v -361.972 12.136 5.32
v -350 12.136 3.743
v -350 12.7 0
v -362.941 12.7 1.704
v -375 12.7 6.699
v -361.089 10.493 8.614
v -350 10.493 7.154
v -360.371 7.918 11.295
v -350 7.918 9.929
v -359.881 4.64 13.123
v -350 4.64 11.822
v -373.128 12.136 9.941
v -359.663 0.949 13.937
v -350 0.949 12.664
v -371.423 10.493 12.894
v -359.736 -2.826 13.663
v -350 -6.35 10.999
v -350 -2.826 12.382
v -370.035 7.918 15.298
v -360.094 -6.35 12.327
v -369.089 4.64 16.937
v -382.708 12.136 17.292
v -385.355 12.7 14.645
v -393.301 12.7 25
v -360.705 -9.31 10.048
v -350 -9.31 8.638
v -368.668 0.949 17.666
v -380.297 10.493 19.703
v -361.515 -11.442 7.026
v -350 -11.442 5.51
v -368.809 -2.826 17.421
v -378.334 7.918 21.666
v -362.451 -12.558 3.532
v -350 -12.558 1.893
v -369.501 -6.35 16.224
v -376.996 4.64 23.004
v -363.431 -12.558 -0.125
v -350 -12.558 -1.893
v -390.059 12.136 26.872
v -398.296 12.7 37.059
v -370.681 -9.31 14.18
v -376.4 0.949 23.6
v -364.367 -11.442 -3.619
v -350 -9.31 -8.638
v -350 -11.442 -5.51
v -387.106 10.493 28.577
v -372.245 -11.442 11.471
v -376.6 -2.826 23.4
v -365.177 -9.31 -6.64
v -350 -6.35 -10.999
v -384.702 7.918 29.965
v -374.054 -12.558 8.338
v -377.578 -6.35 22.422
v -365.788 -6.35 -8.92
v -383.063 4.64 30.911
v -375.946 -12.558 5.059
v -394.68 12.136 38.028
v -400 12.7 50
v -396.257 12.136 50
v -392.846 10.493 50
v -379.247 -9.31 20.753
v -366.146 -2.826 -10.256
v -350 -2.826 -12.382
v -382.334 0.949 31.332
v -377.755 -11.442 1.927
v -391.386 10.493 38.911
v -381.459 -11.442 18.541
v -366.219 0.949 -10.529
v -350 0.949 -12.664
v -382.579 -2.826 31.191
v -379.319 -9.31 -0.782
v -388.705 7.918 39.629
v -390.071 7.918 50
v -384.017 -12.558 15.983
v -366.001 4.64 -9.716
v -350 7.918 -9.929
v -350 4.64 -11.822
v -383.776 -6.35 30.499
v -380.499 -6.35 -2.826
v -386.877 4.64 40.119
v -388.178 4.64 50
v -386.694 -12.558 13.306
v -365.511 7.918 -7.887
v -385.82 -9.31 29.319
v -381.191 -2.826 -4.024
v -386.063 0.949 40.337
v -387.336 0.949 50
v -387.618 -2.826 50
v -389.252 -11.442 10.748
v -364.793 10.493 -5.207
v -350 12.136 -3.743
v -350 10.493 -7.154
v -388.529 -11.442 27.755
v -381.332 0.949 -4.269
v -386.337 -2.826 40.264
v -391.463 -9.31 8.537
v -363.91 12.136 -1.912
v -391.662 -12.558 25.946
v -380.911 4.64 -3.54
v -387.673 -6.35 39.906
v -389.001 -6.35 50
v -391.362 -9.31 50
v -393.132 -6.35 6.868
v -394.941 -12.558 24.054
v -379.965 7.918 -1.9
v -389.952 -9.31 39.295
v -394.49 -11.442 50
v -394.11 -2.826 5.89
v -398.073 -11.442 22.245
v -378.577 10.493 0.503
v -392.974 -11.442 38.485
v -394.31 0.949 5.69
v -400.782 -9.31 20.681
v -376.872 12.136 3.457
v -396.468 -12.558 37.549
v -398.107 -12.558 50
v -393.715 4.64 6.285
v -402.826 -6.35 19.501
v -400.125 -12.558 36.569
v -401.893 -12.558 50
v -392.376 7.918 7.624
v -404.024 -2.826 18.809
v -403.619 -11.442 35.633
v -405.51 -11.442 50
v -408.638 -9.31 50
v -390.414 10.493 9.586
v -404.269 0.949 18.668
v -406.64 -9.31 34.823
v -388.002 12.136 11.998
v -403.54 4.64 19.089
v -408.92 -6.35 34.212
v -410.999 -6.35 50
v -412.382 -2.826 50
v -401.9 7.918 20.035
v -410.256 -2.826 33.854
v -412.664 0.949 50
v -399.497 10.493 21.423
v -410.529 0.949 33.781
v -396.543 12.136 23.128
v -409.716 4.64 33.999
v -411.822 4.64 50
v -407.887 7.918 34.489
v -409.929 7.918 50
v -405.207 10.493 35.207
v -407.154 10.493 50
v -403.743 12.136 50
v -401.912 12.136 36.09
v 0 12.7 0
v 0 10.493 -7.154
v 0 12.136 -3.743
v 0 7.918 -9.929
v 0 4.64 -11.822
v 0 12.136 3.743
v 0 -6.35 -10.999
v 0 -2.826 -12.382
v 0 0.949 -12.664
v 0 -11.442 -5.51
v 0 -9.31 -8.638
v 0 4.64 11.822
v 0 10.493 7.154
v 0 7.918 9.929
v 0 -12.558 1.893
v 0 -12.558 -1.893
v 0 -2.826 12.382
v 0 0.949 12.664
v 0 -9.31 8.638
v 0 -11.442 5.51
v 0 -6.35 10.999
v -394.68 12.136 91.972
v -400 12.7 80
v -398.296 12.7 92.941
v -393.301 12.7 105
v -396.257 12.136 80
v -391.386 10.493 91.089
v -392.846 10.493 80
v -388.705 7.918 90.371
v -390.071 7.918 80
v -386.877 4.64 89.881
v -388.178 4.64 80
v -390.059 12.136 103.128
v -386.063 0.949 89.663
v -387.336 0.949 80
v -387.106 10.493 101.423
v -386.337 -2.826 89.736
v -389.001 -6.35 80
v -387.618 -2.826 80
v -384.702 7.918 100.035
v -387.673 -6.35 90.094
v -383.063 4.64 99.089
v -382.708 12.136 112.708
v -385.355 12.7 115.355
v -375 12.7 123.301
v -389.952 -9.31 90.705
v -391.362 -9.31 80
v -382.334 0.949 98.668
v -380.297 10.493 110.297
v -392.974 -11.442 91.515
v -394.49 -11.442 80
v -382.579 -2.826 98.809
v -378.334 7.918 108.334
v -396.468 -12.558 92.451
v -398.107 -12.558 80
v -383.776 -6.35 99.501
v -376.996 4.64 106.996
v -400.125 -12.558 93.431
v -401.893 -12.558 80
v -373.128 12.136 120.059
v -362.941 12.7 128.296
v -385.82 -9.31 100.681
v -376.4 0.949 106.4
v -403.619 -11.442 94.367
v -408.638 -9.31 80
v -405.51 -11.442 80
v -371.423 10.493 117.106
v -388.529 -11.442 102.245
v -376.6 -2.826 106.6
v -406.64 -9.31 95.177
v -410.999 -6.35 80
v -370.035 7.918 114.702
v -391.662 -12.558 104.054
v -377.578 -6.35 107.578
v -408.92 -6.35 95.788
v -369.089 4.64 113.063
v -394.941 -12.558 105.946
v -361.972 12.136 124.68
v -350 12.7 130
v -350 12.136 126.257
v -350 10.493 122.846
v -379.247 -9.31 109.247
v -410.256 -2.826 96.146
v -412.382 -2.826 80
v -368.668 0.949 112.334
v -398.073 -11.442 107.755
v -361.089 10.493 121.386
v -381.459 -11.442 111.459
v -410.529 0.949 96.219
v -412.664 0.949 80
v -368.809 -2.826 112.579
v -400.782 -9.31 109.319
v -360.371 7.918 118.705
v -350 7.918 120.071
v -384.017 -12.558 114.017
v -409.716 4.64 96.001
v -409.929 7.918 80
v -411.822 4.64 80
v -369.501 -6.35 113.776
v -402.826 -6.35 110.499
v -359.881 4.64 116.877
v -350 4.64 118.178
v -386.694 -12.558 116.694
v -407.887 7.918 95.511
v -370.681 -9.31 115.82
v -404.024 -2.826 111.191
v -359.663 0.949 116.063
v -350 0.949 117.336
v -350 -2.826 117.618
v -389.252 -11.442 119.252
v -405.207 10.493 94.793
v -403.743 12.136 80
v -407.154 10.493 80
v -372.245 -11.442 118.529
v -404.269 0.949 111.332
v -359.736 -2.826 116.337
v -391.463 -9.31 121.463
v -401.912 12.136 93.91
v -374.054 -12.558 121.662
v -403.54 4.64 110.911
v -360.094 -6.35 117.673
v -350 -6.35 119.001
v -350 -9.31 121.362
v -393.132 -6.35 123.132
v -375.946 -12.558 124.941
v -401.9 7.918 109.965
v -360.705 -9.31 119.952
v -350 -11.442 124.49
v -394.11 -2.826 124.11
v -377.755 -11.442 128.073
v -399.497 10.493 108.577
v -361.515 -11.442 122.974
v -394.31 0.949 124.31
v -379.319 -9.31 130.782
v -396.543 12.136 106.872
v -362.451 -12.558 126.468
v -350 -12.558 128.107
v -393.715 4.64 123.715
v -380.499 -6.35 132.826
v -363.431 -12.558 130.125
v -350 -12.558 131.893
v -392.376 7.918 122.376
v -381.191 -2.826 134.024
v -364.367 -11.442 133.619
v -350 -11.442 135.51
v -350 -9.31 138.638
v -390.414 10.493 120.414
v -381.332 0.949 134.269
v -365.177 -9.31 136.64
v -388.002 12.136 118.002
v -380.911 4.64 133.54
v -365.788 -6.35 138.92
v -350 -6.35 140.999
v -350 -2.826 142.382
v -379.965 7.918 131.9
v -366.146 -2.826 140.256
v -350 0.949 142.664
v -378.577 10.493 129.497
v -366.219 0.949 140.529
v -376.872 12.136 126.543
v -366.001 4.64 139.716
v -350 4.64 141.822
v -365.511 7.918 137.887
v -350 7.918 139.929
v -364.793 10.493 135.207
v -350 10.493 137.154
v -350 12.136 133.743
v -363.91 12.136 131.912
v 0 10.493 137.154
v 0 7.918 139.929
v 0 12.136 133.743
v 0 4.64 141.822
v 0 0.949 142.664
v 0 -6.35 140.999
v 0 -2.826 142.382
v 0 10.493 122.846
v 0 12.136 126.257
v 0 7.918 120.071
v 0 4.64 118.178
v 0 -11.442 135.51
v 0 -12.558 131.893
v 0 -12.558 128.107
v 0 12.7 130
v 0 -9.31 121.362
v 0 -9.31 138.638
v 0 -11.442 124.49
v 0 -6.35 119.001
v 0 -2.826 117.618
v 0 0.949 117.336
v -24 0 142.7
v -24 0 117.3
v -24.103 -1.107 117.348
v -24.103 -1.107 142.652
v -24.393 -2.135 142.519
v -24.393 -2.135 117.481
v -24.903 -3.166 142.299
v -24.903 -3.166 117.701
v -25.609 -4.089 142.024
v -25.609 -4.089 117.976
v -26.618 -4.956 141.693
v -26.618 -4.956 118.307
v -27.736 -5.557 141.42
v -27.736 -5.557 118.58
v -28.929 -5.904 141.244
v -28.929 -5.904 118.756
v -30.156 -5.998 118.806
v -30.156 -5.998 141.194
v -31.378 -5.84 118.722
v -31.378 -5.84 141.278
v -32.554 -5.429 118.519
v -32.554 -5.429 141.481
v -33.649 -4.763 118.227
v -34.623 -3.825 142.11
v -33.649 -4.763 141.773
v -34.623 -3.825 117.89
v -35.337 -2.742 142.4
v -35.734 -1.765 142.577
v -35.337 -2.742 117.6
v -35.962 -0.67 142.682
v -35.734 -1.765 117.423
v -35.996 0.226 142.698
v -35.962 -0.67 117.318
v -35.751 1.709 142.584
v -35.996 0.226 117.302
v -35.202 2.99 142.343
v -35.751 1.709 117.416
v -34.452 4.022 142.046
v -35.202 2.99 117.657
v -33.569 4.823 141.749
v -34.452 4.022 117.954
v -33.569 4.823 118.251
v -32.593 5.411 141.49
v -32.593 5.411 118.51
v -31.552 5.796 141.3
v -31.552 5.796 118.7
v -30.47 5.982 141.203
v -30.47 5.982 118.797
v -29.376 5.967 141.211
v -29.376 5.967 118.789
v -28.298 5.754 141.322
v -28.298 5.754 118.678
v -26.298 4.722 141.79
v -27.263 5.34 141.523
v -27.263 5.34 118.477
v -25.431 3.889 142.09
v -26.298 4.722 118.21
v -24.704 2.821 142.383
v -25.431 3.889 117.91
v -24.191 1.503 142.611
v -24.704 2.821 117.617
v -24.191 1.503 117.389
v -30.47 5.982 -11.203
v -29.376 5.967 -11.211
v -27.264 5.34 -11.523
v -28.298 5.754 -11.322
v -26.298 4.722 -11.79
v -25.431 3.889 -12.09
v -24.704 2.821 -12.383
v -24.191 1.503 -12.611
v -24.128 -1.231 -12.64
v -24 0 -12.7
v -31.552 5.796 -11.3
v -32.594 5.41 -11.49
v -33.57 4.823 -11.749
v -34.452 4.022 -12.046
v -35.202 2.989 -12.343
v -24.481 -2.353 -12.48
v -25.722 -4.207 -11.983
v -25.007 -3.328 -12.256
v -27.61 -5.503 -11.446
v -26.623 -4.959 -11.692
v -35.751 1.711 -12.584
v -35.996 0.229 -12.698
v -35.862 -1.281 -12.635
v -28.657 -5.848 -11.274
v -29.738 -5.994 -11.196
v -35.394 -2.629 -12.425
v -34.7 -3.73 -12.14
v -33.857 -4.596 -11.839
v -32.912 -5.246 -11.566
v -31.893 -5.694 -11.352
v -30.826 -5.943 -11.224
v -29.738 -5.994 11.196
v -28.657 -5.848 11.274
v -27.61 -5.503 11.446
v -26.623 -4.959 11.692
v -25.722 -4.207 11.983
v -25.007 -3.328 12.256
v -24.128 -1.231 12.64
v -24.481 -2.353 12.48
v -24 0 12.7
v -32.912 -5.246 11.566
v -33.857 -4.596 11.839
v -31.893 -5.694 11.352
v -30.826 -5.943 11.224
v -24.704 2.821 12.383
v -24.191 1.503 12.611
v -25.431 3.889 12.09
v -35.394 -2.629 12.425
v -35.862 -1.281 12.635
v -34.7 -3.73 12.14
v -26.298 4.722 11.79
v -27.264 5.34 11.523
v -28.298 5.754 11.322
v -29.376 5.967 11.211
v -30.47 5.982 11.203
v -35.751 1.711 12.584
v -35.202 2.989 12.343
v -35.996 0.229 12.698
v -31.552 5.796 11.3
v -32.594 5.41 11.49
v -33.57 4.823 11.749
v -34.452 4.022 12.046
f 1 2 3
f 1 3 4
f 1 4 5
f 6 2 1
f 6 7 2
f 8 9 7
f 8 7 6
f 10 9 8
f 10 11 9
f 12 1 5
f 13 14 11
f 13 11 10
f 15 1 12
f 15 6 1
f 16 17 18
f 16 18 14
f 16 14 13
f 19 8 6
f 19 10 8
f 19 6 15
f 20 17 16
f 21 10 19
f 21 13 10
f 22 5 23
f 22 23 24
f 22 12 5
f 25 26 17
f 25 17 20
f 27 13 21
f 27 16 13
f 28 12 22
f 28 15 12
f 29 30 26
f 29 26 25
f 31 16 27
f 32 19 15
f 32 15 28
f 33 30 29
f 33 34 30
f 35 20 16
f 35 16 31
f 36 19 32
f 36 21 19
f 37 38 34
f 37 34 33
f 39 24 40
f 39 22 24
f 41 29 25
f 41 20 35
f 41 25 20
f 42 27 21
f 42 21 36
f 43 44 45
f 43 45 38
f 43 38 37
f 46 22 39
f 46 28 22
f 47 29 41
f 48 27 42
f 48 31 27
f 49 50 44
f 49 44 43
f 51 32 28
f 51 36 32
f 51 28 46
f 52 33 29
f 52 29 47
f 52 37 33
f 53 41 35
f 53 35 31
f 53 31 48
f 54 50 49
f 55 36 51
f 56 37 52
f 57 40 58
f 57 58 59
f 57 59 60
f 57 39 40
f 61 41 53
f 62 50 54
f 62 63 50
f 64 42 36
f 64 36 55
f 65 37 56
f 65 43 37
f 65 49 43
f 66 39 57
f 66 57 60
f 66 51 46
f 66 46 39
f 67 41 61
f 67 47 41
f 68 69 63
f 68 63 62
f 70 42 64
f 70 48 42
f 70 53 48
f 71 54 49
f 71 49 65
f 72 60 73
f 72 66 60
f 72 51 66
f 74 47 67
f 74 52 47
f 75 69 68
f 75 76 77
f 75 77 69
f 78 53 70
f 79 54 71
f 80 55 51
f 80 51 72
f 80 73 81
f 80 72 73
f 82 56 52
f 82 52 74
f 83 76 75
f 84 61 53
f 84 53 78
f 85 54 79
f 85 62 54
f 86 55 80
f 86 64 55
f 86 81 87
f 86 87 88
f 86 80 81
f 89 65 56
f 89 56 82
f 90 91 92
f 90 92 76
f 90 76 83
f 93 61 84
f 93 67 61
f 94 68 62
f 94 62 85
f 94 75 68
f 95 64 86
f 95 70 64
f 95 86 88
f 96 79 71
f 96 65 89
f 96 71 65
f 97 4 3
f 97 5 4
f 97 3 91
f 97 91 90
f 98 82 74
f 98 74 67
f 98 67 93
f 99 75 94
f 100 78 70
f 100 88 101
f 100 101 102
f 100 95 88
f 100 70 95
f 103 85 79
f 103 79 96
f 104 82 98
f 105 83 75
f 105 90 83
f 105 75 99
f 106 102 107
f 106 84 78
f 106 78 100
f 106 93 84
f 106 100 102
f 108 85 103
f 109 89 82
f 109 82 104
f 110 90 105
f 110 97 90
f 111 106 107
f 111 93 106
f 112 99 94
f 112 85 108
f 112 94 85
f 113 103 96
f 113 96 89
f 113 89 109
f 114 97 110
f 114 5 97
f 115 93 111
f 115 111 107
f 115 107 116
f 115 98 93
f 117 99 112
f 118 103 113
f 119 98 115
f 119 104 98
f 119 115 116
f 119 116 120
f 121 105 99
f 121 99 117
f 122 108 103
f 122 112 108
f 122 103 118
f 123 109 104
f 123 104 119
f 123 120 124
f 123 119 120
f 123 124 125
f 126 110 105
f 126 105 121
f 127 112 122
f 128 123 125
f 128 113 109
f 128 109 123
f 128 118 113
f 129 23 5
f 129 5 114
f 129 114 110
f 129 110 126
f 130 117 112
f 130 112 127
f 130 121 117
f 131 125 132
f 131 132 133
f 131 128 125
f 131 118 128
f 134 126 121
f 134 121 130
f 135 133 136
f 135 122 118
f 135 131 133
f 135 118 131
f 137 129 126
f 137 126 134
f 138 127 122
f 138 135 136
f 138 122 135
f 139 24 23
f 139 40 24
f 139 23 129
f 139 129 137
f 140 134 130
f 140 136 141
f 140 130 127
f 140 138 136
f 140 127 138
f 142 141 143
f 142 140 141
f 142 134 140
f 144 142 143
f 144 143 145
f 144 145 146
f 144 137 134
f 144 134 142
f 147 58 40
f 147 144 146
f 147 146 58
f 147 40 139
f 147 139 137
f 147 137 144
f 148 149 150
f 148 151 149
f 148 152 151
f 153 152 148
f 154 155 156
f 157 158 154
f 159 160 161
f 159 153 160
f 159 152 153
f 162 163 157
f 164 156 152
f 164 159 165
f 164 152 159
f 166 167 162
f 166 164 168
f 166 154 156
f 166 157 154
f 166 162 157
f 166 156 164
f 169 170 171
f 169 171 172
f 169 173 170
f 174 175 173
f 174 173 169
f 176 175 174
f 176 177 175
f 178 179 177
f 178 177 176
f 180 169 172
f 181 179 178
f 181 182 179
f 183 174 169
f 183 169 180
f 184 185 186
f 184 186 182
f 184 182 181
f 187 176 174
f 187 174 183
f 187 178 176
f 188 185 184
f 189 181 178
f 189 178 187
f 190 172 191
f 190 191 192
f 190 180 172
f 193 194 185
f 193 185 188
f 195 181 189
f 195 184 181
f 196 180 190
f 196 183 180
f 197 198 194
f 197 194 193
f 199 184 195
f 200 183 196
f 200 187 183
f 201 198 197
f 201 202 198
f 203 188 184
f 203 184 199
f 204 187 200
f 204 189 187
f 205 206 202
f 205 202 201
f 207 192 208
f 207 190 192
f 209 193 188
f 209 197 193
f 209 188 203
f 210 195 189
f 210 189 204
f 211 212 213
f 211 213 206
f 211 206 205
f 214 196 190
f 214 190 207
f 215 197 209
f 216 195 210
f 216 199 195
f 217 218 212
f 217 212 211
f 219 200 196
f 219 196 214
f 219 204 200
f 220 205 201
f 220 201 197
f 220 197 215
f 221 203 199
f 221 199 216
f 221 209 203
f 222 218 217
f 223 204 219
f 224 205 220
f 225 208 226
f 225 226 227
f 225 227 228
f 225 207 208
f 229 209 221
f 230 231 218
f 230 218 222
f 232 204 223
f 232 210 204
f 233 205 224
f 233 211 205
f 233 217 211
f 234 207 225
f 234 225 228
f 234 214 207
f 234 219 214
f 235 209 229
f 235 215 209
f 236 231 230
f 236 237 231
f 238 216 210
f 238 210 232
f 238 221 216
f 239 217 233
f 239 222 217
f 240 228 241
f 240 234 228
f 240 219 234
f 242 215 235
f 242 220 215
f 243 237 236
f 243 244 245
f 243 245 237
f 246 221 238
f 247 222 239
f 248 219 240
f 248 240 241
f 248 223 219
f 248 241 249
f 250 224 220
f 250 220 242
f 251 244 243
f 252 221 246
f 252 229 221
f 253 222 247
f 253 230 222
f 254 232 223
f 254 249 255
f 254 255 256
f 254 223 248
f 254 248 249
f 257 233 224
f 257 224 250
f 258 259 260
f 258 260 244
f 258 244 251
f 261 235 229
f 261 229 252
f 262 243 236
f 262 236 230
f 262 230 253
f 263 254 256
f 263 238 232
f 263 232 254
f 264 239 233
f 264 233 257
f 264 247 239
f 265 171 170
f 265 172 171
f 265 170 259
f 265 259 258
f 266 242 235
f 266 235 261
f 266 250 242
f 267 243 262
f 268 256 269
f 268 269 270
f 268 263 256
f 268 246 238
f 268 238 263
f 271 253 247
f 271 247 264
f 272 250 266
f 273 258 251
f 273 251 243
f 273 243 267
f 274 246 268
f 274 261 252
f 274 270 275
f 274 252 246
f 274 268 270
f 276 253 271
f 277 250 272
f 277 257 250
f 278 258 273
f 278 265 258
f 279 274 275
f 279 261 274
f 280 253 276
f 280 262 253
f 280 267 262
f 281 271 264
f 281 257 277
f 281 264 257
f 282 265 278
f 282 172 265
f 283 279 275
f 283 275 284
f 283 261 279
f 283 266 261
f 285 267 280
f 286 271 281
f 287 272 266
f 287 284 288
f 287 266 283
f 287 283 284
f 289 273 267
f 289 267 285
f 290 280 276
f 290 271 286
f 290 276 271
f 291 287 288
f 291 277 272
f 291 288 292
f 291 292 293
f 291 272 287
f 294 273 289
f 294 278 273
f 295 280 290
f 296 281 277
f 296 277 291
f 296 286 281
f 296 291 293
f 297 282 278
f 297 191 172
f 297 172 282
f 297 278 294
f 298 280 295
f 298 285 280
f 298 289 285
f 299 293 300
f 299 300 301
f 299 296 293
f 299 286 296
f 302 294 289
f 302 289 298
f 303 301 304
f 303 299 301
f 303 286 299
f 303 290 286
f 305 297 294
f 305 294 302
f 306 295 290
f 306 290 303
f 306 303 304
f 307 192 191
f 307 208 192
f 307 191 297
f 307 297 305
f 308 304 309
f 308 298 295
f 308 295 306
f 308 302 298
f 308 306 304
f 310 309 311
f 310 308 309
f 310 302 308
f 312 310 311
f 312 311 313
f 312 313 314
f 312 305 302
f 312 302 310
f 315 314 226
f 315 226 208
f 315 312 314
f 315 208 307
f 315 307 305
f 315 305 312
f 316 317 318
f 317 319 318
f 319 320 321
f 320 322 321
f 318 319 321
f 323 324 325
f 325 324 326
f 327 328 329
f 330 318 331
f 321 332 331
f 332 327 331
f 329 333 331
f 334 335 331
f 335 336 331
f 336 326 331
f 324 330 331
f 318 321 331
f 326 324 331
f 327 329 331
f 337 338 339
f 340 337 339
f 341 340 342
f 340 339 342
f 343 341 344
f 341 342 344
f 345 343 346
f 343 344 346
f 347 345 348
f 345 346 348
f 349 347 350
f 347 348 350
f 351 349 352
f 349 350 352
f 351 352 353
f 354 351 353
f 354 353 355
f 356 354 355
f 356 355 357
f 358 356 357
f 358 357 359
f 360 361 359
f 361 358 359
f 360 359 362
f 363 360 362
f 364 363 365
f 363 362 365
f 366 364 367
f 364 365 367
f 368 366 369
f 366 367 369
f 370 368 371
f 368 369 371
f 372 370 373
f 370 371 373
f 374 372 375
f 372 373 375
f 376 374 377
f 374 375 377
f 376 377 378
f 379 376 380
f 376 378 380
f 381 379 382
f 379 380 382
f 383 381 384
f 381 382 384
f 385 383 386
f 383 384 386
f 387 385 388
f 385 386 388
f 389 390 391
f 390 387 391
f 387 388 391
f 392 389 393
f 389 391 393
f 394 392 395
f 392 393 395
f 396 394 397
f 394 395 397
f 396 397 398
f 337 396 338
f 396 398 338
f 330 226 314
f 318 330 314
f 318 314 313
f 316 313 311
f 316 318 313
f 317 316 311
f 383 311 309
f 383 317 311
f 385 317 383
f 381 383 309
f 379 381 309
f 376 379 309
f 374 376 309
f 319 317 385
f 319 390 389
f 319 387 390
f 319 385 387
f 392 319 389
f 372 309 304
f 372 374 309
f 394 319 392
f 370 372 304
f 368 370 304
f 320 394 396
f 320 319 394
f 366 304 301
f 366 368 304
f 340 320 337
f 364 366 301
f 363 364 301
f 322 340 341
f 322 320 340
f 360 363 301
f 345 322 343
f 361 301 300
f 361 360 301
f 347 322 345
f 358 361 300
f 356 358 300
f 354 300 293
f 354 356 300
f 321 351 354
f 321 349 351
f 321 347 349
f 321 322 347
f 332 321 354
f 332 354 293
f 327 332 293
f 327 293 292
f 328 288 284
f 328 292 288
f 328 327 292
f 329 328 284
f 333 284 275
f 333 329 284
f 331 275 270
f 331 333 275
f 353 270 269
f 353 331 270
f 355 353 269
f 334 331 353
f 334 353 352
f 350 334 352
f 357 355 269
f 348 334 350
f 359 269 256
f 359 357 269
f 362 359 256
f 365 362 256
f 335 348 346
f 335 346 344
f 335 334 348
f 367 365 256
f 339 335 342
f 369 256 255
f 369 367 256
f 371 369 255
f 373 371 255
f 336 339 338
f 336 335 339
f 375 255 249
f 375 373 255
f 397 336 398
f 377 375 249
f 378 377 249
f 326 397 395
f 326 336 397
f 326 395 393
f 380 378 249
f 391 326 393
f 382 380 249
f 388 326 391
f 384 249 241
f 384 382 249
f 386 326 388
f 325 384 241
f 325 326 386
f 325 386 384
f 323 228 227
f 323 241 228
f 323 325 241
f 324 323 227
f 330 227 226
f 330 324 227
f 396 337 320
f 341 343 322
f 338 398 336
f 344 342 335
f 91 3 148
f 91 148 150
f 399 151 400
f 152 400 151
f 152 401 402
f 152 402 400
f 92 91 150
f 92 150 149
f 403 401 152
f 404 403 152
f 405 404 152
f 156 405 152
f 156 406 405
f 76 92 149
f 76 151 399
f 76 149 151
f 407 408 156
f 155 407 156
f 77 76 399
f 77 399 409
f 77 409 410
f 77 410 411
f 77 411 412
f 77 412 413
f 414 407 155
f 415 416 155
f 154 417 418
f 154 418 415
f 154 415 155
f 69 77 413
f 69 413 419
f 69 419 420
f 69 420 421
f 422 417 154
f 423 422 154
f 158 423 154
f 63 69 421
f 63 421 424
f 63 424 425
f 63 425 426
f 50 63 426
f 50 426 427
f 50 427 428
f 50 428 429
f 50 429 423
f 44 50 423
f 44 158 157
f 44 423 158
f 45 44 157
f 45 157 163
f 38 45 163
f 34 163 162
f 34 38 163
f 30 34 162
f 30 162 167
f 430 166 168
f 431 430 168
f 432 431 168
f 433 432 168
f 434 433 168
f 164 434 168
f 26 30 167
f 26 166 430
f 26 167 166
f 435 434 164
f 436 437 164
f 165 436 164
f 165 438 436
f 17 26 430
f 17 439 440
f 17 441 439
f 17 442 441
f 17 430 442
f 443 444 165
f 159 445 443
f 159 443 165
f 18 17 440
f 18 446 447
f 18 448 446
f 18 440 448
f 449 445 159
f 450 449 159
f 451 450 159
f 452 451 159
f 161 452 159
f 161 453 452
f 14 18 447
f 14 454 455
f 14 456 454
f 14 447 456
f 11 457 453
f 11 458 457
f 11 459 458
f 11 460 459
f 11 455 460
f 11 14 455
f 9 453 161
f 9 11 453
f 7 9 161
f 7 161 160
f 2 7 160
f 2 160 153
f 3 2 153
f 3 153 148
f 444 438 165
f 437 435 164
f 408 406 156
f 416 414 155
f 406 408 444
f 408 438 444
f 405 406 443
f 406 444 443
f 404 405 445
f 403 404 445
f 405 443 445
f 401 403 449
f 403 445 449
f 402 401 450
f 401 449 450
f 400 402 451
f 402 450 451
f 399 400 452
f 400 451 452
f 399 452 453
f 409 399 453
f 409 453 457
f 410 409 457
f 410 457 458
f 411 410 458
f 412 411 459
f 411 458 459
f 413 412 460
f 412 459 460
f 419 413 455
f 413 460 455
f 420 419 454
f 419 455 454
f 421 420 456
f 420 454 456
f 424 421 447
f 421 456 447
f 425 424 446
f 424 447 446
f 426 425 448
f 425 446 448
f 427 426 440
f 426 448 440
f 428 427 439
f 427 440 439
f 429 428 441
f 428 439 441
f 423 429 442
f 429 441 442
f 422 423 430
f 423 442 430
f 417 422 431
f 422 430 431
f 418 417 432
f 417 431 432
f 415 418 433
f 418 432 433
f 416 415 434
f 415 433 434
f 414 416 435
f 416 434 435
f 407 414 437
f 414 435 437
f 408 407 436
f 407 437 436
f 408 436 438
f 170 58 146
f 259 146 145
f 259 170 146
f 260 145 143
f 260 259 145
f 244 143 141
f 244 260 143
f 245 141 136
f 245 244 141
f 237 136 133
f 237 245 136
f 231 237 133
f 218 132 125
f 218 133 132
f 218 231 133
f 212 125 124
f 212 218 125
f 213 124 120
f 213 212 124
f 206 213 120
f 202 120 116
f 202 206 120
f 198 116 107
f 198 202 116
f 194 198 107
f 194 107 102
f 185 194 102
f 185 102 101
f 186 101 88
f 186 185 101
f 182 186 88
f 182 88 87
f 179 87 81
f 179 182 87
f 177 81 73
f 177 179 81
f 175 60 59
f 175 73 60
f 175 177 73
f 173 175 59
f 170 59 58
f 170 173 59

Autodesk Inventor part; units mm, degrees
ref_plane "YZ Plane" through (0, 0, 0) normal (1, 0, 0) x (0, 1, 0)
ref_plane "XZ Plane" through (0, 0, 0) normal (0, 1, 0) x (-1, 0, 0)
ref_plane "XY Plane" through (0, 0, 0) normal (0, 0, 1) x (1, 0, 0)
sketch "Sketch1" plane through (0, 0, 0) normal (0, 1, 0) x (-1, 0, 0)
  line L0 (0, 0) -> (350, 0)
  line L1 (400, 50) -> (400, 80)
  line L2 (350, 130) -> (0, 130)
  arc A0 (350, 0) -> (400, 50) centre (350, 50) ccw
  arc A1 (400, 80) -> (350, 130) centre (350, 80) ccw
  point P0 (400, 0)
  point P1 (400, 130)
  dimension "d7" = 400
  dimension "d8" = 130
  dimension "d9" = 400
  dimension "d10" = 50
sketch "Sketch2" plane through (0, 0, 0) normal (1, 0, 0) x (0, 1, 0)
  circle A0 centre (0, 0) radius 12.7
  dimension "d11" = 25.4
sweep "Sweep1" add profiles "Sketch2" path "Sketch1"
sketch "Sketch3" plane through (0, 0, 0) normal (0, 0, 1) x (1, 0, 0)
  line L0 (0, 0) -> (-30, 0)
  circle A0 centre (-30, 0) radius 6
  dimension "d14" = 30
  dimension "d15" = 12
extrude "Extrusion1" cut sketch "Sketch3" along normal through all both and the other way through all
properties part number "GARFO"
